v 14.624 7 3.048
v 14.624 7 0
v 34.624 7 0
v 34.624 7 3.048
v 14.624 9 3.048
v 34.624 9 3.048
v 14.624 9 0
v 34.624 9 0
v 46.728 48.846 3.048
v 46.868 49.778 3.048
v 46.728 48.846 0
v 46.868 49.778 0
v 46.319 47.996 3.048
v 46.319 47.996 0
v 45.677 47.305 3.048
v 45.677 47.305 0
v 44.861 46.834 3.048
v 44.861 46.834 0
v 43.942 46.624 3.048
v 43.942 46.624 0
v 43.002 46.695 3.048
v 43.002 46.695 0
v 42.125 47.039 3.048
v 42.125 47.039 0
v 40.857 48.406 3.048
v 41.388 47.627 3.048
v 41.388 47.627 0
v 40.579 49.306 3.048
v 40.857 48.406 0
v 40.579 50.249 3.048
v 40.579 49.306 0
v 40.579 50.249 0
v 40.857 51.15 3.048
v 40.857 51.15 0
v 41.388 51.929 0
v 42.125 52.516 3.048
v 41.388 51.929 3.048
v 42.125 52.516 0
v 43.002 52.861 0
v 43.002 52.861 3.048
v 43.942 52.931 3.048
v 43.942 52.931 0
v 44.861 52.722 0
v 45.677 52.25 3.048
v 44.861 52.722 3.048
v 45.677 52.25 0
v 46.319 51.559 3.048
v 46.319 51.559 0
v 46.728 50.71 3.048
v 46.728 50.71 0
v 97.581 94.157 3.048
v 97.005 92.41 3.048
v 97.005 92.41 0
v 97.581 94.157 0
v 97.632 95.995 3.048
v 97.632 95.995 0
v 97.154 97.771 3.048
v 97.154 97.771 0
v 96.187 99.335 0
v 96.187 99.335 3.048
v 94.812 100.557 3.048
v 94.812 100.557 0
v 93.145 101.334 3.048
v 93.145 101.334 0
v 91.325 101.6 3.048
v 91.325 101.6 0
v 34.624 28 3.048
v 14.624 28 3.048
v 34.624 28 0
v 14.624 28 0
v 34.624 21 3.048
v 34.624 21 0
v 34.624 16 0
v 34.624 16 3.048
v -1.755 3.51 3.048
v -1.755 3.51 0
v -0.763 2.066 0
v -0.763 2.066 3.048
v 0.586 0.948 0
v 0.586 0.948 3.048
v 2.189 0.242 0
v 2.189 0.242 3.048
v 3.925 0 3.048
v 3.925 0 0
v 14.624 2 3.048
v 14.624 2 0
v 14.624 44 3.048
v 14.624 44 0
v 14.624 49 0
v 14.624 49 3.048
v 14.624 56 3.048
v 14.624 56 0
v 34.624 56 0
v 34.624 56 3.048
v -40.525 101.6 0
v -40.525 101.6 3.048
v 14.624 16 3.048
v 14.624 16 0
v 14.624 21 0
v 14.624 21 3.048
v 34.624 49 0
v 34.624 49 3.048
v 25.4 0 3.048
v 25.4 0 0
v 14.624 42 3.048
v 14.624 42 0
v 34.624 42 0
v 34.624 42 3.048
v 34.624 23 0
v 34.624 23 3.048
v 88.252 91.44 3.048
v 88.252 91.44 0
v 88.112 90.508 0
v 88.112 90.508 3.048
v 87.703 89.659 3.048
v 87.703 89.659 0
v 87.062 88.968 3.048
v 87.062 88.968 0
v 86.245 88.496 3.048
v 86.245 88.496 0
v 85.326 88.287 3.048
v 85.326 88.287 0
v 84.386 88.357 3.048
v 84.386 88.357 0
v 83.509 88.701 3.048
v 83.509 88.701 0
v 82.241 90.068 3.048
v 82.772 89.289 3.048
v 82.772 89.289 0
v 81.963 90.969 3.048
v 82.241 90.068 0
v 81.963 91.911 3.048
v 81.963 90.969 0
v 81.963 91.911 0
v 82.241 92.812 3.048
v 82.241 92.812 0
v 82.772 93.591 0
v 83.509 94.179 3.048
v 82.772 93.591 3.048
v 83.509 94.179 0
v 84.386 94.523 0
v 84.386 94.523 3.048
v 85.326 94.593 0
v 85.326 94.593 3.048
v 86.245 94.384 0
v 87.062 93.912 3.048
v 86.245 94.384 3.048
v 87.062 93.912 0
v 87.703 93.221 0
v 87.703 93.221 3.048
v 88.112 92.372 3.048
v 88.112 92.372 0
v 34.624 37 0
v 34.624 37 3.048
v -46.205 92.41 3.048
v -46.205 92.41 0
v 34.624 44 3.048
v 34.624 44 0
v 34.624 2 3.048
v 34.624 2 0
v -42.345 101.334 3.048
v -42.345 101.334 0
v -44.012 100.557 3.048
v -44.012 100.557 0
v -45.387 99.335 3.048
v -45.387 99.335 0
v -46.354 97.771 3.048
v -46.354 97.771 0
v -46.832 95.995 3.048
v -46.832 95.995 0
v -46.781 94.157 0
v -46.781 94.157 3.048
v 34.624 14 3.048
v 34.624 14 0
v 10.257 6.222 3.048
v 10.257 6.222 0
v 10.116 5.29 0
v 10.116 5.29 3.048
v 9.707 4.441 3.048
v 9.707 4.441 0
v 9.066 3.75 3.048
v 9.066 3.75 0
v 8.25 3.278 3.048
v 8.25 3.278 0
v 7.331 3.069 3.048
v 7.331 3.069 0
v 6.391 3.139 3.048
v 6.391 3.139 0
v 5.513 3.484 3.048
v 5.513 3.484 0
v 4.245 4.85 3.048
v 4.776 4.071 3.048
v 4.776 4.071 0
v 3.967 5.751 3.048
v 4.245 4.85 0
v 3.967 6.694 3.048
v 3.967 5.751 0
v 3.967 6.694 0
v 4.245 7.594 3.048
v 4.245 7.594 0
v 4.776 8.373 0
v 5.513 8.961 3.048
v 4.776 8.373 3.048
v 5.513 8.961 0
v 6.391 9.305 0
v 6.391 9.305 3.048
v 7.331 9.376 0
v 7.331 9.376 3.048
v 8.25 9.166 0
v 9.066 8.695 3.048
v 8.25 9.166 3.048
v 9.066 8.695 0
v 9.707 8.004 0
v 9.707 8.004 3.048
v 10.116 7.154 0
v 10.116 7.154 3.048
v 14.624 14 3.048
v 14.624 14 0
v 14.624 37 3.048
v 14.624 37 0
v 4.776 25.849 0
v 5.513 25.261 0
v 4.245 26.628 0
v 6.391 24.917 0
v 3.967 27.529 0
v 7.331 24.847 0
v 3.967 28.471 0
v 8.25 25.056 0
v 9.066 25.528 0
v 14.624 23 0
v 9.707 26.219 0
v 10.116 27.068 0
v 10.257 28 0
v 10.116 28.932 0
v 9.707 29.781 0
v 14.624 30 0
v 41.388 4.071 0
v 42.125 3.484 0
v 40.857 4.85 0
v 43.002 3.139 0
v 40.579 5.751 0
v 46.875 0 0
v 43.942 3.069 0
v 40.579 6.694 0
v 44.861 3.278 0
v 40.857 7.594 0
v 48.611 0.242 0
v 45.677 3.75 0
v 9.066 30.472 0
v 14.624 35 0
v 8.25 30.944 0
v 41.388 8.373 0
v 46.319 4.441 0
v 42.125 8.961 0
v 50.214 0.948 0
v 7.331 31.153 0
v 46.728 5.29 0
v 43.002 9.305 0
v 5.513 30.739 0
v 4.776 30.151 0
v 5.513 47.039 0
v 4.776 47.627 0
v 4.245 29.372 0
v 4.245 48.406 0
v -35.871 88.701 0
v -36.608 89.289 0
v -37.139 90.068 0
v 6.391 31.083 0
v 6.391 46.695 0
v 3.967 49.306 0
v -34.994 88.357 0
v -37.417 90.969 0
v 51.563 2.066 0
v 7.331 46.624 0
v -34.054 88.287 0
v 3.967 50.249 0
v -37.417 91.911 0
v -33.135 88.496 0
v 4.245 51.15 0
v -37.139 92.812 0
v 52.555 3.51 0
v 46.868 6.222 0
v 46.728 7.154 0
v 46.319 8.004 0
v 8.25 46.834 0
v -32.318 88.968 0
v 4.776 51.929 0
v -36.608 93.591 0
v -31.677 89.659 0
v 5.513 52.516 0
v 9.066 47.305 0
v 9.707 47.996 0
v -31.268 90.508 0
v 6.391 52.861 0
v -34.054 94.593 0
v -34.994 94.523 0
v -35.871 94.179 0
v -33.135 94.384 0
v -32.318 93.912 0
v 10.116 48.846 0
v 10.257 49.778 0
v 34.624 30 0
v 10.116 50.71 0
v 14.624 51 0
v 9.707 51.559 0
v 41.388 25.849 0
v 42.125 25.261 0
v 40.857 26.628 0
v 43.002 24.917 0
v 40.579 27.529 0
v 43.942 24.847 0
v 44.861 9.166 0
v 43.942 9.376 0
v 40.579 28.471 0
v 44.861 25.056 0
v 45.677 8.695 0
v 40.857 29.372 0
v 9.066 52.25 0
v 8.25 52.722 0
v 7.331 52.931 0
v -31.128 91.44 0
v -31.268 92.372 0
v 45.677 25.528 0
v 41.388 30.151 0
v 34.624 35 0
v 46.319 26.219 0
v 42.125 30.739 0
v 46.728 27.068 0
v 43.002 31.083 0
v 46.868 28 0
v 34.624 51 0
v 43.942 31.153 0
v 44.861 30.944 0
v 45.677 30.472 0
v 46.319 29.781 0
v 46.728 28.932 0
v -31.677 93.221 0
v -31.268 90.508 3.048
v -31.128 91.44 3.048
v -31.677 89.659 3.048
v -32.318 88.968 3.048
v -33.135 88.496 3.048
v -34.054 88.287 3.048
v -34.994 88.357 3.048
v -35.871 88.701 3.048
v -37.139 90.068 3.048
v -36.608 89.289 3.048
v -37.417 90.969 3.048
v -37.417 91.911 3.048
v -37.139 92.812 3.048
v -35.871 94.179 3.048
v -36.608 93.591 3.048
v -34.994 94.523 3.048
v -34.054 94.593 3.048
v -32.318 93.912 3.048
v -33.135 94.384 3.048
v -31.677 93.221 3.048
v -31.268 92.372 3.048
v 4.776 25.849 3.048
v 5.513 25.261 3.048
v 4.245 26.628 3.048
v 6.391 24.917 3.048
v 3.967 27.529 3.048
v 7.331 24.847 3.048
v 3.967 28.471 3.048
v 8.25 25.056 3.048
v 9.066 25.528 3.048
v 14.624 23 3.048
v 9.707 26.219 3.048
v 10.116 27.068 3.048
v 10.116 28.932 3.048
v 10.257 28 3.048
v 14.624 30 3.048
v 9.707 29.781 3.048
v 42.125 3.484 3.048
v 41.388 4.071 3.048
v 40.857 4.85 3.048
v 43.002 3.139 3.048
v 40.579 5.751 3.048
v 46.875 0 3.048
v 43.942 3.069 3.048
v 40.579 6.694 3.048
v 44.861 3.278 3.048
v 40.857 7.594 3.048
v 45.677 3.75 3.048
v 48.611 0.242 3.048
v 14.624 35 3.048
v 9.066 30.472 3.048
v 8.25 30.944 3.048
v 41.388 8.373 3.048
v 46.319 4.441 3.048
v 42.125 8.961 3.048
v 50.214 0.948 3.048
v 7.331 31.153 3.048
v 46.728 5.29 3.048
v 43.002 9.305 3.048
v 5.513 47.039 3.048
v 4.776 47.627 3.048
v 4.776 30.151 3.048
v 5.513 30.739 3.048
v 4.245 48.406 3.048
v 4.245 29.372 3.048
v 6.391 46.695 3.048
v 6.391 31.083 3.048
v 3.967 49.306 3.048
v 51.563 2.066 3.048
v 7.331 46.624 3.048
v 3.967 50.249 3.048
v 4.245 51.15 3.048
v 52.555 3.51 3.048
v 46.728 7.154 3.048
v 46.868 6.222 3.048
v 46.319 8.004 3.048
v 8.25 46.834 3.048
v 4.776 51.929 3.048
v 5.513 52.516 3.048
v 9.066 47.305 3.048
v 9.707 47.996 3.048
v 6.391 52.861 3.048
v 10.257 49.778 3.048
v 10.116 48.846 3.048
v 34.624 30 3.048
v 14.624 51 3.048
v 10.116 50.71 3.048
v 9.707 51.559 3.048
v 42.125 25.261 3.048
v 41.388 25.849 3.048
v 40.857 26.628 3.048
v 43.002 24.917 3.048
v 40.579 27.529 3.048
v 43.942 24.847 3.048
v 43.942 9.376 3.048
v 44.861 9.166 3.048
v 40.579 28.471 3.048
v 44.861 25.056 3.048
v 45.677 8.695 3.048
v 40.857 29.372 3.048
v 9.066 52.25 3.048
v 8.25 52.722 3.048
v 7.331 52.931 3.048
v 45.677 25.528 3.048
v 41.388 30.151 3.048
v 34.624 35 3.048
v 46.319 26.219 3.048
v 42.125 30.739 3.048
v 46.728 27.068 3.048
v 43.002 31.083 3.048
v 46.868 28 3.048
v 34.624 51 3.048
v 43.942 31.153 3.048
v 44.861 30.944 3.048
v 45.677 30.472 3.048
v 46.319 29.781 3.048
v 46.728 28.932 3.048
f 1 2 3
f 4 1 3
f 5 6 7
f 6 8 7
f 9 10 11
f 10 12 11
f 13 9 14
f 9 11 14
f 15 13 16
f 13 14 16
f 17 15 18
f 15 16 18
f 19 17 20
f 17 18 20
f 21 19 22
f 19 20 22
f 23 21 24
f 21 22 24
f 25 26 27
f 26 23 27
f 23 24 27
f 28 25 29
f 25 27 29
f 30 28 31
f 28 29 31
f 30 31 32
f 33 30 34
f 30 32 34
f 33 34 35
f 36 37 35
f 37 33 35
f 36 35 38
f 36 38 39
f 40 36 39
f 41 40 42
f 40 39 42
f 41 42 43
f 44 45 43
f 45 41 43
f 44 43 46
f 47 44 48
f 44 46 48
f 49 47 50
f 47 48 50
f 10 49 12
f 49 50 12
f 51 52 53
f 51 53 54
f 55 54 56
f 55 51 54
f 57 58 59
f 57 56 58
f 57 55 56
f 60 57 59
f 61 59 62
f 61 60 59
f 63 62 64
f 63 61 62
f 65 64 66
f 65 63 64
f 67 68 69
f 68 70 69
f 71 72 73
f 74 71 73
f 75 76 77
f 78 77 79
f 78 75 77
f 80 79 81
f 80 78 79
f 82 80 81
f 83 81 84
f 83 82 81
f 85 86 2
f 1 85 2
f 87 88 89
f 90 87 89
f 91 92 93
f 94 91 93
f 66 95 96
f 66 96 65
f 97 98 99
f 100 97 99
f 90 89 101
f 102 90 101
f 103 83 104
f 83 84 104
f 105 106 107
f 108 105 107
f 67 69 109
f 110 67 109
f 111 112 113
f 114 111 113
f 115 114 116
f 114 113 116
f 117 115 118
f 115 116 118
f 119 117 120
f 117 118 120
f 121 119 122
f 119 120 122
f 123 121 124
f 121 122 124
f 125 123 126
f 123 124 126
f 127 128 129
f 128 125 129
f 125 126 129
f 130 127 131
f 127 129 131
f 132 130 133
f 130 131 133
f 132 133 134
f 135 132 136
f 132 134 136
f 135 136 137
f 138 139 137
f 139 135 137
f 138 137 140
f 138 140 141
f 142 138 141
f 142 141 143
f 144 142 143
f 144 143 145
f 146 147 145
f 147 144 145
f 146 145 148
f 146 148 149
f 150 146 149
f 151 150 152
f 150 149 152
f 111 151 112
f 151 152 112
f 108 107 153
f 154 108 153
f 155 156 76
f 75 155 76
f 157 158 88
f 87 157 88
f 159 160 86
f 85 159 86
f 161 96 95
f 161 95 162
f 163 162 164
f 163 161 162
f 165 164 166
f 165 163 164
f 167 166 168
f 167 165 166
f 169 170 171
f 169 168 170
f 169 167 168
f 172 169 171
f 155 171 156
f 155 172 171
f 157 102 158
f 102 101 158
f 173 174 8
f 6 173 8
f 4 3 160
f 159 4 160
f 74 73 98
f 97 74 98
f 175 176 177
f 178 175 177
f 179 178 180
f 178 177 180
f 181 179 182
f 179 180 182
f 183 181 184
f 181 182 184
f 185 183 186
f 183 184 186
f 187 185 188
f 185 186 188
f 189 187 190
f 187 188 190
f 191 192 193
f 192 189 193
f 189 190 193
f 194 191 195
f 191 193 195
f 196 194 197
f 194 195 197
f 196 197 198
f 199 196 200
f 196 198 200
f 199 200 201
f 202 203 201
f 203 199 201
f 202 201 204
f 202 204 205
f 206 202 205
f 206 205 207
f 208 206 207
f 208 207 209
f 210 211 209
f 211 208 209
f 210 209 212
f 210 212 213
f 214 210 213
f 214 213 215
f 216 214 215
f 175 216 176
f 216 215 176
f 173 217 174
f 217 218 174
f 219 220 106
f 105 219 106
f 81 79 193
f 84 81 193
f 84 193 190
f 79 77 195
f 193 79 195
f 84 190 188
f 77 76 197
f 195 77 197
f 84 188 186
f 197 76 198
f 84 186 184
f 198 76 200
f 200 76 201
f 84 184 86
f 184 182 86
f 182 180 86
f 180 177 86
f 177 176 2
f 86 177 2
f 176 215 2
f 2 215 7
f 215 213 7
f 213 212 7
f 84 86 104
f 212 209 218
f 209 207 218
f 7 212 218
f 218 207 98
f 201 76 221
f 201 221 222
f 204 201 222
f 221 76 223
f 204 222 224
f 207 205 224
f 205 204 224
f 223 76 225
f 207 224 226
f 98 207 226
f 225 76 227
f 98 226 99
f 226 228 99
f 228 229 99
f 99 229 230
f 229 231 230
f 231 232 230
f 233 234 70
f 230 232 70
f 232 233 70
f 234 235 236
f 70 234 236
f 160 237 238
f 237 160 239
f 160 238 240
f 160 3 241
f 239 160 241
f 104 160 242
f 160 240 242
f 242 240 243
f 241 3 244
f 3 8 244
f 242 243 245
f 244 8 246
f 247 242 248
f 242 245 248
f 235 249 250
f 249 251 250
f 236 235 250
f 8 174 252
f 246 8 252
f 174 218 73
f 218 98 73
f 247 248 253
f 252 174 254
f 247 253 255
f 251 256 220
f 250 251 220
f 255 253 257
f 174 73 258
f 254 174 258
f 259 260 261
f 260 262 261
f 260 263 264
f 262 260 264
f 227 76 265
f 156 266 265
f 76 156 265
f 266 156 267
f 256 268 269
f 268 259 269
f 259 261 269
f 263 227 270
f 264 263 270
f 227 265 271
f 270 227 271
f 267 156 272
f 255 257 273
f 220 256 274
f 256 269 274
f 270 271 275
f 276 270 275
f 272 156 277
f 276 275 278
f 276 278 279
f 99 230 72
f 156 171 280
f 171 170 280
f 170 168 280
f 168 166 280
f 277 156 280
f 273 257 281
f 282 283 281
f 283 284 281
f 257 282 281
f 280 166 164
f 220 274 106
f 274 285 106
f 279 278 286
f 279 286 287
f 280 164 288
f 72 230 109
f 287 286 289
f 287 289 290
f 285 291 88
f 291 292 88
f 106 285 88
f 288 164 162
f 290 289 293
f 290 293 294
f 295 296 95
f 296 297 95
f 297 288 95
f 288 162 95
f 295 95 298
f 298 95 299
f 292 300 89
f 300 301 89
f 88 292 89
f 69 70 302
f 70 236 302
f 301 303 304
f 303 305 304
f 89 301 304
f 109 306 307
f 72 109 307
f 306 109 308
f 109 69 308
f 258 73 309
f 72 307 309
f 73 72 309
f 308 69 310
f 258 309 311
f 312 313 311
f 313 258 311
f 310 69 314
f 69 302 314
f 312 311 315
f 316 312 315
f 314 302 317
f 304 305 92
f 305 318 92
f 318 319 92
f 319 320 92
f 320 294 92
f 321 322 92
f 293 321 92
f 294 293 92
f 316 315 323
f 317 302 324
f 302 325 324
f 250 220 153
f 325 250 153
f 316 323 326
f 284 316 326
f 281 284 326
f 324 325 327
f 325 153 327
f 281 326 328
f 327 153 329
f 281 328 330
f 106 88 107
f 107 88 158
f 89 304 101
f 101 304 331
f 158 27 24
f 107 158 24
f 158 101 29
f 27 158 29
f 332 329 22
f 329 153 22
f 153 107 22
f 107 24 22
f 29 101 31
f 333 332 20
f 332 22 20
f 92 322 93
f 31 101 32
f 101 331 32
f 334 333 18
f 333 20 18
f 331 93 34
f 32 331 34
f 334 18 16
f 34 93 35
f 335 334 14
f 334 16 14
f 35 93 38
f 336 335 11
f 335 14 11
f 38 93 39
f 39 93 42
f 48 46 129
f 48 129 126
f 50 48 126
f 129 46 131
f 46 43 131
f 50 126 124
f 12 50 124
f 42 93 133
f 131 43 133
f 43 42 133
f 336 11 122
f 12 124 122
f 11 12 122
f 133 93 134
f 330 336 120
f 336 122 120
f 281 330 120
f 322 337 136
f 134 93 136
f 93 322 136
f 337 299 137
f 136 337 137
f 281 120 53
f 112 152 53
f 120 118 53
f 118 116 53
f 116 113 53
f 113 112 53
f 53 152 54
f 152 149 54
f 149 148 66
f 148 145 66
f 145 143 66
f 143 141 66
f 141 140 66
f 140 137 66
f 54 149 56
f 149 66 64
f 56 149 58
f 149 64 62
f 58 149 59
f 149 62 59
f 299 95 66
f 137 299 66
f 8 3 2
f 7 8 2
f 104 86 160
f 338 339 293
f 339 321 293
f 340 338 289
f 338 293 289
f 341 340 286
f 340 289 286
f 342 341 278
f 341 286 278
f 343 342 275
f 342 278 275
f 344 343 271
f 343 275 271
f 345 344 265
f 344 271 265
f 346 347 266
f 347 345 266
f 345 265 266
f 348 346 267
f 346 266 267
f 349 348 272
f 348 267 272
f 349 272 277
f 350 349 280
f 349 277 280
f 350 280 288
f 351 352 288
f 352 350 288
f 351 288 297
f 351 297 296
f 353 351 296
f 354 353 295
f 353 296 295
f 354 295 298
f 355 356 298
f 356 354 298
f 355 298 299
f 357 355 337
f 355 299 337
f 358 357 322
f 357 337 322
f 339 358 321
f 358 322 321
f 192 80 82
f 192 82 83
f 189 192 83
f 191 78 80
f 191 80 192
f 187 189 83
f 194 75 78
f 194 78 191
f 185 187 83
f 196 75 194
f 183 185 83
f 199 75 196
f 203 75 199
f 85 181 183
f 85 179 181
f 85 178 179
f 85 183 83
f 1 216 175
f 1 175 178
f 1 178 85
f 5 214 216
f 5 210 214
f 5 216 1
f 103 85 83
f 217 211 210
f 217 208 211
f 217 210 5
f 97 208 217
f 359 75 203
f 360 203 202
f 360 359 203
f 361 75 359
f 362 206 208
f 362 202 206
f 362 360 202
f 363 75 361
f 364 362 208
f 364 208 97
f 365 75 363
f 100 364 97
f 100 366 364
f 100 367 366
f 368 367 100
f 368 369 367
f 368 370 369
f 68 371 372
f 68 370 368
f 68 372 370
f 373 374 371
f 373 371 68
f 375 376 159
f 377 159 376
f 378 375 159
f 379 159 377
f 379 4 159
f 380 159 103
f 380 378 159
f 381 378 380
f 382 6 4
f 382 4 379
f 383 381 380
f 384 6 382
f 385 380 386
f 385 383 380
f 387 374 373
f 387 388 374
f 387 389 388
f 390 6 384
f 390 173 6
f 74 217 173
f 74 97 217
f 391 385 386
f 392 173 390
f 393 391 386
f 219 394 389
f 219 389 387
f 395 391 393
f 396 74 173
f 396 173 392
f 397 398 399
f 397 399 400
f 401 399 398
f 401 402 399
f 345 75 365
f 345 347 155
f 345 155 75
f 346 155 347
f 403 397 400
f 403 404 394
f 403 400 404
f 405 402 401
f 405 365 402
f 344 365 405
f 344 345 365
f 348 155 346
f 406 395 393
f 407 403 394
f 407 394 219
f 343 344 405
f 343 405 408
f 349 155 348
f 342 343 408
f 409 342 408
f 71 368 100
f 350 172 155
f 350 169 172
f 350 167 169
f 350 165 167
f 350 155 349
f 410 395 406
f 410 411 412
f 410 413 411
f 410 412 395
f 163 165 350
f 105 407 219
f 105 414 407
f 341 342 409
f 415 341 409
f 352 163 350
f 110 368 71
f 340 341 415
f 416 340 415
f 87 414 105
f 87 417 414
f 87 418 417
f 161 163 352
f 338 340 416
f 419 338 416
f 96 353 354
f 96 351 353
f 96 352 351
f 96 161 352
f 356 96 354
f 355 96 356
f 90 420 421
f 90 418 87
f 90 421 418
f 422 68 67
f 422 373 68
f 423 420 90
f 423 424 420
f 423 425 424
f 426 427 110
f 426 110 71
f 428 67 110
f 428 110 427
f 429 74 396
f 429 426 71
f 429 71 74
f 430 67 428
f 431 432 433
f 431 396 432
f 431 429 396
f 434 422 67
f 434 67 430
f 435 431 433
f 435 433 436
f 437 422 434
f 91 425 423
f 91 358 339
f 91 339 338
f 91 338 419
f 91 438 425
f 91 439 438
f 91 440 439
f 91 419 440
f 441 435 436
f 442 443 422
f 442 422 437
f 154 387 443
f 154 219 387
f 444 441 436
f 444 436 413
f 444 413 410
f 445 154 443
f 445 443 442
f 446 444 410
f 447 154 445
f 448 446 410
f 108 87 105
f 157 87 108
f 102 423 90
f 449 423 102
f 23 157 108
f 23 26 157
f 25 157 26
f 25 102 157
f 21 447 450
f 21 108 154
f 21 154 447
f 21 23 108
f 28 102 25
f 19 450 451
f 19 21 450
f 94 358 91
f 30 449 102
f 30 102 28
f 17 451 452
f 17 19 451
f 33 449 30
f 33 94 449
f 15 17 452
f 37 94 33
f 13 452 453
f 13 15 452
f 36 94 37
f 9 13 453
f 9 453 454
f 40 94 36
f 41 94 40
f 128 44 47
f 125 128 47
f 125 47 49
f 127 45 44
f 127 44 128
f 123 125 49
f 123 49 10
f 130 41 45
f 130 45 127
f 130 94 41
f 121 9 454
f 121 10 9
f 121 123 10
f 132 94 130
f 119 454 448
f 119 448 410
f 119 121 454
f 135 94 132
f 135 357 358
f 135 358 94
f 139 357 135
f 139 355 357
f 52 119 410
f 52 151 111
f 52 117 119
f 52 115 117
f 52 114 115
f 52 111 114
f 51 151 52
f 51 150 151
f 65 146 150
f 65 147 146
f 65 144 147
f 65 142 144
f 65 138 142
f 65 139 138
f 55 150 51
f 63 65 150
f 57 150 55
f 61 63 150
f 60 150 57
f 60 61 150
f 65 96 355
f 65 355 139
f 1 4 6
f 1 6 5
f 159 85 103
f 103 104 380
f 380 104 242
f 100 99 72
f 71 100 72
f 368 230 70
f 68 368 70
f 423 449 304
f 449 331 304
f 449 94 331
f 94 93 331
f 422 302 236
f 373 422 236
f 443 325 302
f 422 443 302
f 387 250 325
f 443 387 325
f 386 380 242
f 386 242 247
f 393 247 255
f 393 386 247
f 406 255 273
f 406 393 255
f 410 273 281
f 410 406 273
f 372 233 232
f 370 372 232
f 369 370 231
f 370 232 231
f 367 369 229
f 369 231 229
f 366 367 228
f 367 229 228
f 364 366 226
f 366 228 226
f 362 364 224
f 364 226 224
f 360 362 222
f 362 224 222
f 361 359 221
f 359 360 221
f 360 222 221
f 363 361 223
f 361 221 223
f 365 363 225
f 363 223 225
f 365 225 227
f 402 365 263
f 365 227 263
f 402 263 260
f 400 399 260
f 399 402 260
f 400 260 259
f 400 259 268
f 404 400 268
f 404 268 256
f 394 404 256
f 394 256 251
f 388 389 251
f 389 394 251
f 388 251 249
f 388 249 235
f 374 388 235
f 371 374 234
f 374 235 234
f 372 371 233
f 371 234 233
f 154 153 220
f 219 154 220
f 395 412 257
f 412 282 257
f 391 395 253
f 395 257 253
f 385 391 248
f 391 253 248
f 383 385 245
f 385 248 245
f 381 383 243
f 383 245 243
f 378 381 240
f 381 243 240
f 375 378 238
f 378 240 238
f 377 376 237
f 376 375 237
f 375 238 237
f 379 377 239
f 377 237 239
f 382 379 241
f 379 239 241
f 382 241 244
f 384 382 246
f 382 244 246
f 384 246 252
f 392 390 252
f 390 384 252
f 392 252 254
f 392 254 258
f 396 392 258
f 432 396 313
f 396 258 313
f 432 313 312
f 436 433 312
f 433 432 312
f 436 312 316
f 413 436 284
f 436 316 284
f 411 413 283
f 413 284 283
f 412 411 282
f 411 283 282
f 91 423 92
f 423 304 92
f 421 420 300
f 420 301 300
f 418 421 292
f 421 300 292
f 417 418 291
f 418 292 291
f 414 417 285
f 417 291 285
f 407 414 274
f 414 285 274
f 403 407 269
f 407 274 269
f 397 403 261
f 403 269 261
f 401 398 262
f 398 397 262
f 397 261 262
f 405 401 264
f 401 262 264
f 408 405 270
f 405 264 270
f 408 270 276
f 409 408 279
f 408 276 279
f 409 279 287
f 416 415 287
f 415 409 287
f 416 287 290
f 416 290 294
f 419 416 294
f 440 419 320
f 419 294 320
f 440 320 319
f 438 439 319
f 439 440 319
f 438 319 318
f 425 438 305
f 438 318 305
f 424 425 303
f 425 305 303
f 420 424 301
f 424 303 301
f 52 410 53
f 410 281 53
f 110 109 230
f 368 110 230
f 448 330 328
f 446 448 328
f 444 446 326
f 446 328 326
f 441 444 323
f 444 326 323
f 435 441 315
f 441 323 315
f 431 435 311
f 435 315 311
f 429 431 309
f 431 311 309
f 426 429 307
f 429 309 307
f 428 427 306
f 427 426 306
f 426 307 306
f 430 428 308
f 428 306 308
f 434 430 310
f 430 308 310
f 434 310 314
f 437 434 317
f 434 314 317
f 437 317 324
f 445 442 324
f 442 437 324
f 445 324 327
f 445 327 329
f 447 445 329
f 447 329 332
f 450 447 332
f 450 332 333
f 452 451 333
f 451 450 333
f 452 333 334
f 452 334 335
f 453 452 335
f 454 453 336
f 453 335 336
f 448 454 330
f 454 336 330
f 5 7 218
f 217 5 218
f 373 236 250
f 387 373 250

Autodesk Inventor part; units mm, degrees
ref_plane "YZ Plane" through (0, 0, 0) normal (1, 0, 0) x (0, 1, 0)
ref_plane "XZ Plane" through (0, 0, 0) normal (0, 1, 0) x (-1, 0, 0)
ref_plane "XY Plane" through (0, 0, 0) normal (0, 0, 1) x (1, 0, 0)
sketch "Sketch1" plane through (0, 0, 0) normal (0, 0, 1) x (1, 0, 0)
  line L0 (0, 0) -> (50.8, 0)
  line L1 (-50.8, 101.6) -> (101.6, 101.6)
  line L2 (50.8, 0) -> (101.6, 101.6)
  line L3 (-50.8, 101.6) -> (0, 0)
  line L4 (14.6239, 7) -> (34.6239, 7)
  line L5 (34.6239, 7) -> (34.6239, 2)
  line L6 (34.6239, 2) -> (14.6239, 2)
  line L7 (14.6239, 2) -> (14.6239, 7)
  line L8 (50.8, 0) -> (50.8, 62.4863)
  line L9 (14.6239, 14) -> (34.6239, 14)
  line L10 (34.6239, 14) -> (34.6239, 9)
  line L11 (34.6239, 9) -> (14.6239, 9)
  line L12 (14.6239, 9) -> (14.6239, 14)
  line L13 (14.6239, 21) -> (34.6239, 21)
  line L14 (34.6239, 21) -> (34.6239, 16)
  line L15 (34.6239, 16) -> (14.6239, 16)
  line L16 (14.6239, 16) -> (14.6239, 21)
  line L17 (14.6239, 28) -> (34.6239, 28)
  line L18 (34.6239, 28) -> (34.6239, 23)
  line L19 (34.6239, 23) -> (14.6239, 23)
  line L20 (14.6239, 23) -> (14.6239, 28)
  line L21 (14.6239, 35) -> (34.6239, 35)
  line L22 (34.6239, 35) -> (34.6239, 30)
  line L23 (34.6239, 30) -> (14.6239, 30)
  line L24 (14.6239, 30) -> (14.6239, 35)
  line L25 (14.6239, 42) -> (34.6239, 42)
  line L26 (34.6239, 42) -> (34.6239, 37)
  line L27 (34.6239, 37) -> (14.6239, 37)
  line L28 (14.6239, 37) -> (14.6239, 42)
  circle A0 centre (43.7057, 6.2222) radius 3.1623
  circle A1 centre (43.7057, 28) radius 3.1623
  circle A2 centre (43.7057, 49.7778) radius 3.1623
  line L29 (25.4, 0) -> (25.4, -15.6085)
  circle A3 centre (7.0943, 6.2222) radius 3.1623
  circle A4 centre (7.0943, 28) radius 3.1623
  circle A5 centre (7.0943, 49.7778) radius 3.1623
  line L30 (14.6239, 49) -> (34.6239, 49)
  line L31 (34.6239, 49) -> (34.6239, 44)
  line L32 (34.6239, 44) -> (14.6239, 44)
  line L33 (14.6239, 44) -> (14.6239, 49)
  line L34 (14.6239, 56) -> (34.6239, 56)
  line L35 (34.6239, 56) -> (34.6239, 51)
  line L36 (34.6239, 51) -> (14.6239, 51)
  line L37 (14.6239, 51) -> (14.6239, 56)
  circle A6 centre (-34.29, 91.44) radius 3.1623
  circle A7 centre (85.09, 91.44) radius 3.1623
  dimension "d0" = 50.8
  dimension "d1" = 152.4
  dimension "d2" = 101.6
  dimension "d5" = 50.8
  dimension "d6" = 20
  dimension "d7" = 5
  dimension "d8" = 2
  dimension "d11" = 7
  dimension "d16" = 6.3246
  dimension "d19" = 6.3246
  dimension "d21" = 6.3246
  dimension "d26" = 14
  dimension "d31" = 56
  dimension "d35" = 6.2222
  dimension "d36" = 6.2222
  dimension "d37" = 28
  dimension "d38" = 6.3246
  dimension "d39" = 6.3246
  dimension "d40" = 34.29
  dimension "d41" = 34.29
  dimension "d42" = 10.16
  dimension "d43" = 10.16
  dimension "d46" = 9.0818
extrude "Plate1" add sketch "Sketch1" along normal blind 3.048
fillet "Corner Round1" radius 6.35 4 edges at (101.6, 101.6, 1.524) (-50.8, 101.6, 1.524) (50.8, 0, 1.524) (0, 0, 1.524)
equation "\"d19\" = d16"
equation "\"d21\" = d19"
equation "\"d35\" = 0.111111 * d31"
equation "\"d36\" = d35"
equation "\"d37\" = 0.5 * d31"
equation "\"d41\" = d40"
equation "\"d43\" = d42"
equation "\"BendRadius\" = Thickness"
equation "\"BendReliefWidth\" = Thickness"
equation "\"BendReliefDepth\" = 0.5 * Thickness"
equation "\"CornerReliefSize\" = 4 * Thickness"
equation "\"MinimumRemnant\" = 2 * Thickness"
equation "\"TransitionRadius\" = BendRadius"
equation "\"JacobiRadiusSize\" = BendRadius"
equation "\"GapSize\" = Thickness"
equation "\"d44\" = BendRadius"
equation "\"Thickness\" = 3.048"
properties part number "Belt plate base"
